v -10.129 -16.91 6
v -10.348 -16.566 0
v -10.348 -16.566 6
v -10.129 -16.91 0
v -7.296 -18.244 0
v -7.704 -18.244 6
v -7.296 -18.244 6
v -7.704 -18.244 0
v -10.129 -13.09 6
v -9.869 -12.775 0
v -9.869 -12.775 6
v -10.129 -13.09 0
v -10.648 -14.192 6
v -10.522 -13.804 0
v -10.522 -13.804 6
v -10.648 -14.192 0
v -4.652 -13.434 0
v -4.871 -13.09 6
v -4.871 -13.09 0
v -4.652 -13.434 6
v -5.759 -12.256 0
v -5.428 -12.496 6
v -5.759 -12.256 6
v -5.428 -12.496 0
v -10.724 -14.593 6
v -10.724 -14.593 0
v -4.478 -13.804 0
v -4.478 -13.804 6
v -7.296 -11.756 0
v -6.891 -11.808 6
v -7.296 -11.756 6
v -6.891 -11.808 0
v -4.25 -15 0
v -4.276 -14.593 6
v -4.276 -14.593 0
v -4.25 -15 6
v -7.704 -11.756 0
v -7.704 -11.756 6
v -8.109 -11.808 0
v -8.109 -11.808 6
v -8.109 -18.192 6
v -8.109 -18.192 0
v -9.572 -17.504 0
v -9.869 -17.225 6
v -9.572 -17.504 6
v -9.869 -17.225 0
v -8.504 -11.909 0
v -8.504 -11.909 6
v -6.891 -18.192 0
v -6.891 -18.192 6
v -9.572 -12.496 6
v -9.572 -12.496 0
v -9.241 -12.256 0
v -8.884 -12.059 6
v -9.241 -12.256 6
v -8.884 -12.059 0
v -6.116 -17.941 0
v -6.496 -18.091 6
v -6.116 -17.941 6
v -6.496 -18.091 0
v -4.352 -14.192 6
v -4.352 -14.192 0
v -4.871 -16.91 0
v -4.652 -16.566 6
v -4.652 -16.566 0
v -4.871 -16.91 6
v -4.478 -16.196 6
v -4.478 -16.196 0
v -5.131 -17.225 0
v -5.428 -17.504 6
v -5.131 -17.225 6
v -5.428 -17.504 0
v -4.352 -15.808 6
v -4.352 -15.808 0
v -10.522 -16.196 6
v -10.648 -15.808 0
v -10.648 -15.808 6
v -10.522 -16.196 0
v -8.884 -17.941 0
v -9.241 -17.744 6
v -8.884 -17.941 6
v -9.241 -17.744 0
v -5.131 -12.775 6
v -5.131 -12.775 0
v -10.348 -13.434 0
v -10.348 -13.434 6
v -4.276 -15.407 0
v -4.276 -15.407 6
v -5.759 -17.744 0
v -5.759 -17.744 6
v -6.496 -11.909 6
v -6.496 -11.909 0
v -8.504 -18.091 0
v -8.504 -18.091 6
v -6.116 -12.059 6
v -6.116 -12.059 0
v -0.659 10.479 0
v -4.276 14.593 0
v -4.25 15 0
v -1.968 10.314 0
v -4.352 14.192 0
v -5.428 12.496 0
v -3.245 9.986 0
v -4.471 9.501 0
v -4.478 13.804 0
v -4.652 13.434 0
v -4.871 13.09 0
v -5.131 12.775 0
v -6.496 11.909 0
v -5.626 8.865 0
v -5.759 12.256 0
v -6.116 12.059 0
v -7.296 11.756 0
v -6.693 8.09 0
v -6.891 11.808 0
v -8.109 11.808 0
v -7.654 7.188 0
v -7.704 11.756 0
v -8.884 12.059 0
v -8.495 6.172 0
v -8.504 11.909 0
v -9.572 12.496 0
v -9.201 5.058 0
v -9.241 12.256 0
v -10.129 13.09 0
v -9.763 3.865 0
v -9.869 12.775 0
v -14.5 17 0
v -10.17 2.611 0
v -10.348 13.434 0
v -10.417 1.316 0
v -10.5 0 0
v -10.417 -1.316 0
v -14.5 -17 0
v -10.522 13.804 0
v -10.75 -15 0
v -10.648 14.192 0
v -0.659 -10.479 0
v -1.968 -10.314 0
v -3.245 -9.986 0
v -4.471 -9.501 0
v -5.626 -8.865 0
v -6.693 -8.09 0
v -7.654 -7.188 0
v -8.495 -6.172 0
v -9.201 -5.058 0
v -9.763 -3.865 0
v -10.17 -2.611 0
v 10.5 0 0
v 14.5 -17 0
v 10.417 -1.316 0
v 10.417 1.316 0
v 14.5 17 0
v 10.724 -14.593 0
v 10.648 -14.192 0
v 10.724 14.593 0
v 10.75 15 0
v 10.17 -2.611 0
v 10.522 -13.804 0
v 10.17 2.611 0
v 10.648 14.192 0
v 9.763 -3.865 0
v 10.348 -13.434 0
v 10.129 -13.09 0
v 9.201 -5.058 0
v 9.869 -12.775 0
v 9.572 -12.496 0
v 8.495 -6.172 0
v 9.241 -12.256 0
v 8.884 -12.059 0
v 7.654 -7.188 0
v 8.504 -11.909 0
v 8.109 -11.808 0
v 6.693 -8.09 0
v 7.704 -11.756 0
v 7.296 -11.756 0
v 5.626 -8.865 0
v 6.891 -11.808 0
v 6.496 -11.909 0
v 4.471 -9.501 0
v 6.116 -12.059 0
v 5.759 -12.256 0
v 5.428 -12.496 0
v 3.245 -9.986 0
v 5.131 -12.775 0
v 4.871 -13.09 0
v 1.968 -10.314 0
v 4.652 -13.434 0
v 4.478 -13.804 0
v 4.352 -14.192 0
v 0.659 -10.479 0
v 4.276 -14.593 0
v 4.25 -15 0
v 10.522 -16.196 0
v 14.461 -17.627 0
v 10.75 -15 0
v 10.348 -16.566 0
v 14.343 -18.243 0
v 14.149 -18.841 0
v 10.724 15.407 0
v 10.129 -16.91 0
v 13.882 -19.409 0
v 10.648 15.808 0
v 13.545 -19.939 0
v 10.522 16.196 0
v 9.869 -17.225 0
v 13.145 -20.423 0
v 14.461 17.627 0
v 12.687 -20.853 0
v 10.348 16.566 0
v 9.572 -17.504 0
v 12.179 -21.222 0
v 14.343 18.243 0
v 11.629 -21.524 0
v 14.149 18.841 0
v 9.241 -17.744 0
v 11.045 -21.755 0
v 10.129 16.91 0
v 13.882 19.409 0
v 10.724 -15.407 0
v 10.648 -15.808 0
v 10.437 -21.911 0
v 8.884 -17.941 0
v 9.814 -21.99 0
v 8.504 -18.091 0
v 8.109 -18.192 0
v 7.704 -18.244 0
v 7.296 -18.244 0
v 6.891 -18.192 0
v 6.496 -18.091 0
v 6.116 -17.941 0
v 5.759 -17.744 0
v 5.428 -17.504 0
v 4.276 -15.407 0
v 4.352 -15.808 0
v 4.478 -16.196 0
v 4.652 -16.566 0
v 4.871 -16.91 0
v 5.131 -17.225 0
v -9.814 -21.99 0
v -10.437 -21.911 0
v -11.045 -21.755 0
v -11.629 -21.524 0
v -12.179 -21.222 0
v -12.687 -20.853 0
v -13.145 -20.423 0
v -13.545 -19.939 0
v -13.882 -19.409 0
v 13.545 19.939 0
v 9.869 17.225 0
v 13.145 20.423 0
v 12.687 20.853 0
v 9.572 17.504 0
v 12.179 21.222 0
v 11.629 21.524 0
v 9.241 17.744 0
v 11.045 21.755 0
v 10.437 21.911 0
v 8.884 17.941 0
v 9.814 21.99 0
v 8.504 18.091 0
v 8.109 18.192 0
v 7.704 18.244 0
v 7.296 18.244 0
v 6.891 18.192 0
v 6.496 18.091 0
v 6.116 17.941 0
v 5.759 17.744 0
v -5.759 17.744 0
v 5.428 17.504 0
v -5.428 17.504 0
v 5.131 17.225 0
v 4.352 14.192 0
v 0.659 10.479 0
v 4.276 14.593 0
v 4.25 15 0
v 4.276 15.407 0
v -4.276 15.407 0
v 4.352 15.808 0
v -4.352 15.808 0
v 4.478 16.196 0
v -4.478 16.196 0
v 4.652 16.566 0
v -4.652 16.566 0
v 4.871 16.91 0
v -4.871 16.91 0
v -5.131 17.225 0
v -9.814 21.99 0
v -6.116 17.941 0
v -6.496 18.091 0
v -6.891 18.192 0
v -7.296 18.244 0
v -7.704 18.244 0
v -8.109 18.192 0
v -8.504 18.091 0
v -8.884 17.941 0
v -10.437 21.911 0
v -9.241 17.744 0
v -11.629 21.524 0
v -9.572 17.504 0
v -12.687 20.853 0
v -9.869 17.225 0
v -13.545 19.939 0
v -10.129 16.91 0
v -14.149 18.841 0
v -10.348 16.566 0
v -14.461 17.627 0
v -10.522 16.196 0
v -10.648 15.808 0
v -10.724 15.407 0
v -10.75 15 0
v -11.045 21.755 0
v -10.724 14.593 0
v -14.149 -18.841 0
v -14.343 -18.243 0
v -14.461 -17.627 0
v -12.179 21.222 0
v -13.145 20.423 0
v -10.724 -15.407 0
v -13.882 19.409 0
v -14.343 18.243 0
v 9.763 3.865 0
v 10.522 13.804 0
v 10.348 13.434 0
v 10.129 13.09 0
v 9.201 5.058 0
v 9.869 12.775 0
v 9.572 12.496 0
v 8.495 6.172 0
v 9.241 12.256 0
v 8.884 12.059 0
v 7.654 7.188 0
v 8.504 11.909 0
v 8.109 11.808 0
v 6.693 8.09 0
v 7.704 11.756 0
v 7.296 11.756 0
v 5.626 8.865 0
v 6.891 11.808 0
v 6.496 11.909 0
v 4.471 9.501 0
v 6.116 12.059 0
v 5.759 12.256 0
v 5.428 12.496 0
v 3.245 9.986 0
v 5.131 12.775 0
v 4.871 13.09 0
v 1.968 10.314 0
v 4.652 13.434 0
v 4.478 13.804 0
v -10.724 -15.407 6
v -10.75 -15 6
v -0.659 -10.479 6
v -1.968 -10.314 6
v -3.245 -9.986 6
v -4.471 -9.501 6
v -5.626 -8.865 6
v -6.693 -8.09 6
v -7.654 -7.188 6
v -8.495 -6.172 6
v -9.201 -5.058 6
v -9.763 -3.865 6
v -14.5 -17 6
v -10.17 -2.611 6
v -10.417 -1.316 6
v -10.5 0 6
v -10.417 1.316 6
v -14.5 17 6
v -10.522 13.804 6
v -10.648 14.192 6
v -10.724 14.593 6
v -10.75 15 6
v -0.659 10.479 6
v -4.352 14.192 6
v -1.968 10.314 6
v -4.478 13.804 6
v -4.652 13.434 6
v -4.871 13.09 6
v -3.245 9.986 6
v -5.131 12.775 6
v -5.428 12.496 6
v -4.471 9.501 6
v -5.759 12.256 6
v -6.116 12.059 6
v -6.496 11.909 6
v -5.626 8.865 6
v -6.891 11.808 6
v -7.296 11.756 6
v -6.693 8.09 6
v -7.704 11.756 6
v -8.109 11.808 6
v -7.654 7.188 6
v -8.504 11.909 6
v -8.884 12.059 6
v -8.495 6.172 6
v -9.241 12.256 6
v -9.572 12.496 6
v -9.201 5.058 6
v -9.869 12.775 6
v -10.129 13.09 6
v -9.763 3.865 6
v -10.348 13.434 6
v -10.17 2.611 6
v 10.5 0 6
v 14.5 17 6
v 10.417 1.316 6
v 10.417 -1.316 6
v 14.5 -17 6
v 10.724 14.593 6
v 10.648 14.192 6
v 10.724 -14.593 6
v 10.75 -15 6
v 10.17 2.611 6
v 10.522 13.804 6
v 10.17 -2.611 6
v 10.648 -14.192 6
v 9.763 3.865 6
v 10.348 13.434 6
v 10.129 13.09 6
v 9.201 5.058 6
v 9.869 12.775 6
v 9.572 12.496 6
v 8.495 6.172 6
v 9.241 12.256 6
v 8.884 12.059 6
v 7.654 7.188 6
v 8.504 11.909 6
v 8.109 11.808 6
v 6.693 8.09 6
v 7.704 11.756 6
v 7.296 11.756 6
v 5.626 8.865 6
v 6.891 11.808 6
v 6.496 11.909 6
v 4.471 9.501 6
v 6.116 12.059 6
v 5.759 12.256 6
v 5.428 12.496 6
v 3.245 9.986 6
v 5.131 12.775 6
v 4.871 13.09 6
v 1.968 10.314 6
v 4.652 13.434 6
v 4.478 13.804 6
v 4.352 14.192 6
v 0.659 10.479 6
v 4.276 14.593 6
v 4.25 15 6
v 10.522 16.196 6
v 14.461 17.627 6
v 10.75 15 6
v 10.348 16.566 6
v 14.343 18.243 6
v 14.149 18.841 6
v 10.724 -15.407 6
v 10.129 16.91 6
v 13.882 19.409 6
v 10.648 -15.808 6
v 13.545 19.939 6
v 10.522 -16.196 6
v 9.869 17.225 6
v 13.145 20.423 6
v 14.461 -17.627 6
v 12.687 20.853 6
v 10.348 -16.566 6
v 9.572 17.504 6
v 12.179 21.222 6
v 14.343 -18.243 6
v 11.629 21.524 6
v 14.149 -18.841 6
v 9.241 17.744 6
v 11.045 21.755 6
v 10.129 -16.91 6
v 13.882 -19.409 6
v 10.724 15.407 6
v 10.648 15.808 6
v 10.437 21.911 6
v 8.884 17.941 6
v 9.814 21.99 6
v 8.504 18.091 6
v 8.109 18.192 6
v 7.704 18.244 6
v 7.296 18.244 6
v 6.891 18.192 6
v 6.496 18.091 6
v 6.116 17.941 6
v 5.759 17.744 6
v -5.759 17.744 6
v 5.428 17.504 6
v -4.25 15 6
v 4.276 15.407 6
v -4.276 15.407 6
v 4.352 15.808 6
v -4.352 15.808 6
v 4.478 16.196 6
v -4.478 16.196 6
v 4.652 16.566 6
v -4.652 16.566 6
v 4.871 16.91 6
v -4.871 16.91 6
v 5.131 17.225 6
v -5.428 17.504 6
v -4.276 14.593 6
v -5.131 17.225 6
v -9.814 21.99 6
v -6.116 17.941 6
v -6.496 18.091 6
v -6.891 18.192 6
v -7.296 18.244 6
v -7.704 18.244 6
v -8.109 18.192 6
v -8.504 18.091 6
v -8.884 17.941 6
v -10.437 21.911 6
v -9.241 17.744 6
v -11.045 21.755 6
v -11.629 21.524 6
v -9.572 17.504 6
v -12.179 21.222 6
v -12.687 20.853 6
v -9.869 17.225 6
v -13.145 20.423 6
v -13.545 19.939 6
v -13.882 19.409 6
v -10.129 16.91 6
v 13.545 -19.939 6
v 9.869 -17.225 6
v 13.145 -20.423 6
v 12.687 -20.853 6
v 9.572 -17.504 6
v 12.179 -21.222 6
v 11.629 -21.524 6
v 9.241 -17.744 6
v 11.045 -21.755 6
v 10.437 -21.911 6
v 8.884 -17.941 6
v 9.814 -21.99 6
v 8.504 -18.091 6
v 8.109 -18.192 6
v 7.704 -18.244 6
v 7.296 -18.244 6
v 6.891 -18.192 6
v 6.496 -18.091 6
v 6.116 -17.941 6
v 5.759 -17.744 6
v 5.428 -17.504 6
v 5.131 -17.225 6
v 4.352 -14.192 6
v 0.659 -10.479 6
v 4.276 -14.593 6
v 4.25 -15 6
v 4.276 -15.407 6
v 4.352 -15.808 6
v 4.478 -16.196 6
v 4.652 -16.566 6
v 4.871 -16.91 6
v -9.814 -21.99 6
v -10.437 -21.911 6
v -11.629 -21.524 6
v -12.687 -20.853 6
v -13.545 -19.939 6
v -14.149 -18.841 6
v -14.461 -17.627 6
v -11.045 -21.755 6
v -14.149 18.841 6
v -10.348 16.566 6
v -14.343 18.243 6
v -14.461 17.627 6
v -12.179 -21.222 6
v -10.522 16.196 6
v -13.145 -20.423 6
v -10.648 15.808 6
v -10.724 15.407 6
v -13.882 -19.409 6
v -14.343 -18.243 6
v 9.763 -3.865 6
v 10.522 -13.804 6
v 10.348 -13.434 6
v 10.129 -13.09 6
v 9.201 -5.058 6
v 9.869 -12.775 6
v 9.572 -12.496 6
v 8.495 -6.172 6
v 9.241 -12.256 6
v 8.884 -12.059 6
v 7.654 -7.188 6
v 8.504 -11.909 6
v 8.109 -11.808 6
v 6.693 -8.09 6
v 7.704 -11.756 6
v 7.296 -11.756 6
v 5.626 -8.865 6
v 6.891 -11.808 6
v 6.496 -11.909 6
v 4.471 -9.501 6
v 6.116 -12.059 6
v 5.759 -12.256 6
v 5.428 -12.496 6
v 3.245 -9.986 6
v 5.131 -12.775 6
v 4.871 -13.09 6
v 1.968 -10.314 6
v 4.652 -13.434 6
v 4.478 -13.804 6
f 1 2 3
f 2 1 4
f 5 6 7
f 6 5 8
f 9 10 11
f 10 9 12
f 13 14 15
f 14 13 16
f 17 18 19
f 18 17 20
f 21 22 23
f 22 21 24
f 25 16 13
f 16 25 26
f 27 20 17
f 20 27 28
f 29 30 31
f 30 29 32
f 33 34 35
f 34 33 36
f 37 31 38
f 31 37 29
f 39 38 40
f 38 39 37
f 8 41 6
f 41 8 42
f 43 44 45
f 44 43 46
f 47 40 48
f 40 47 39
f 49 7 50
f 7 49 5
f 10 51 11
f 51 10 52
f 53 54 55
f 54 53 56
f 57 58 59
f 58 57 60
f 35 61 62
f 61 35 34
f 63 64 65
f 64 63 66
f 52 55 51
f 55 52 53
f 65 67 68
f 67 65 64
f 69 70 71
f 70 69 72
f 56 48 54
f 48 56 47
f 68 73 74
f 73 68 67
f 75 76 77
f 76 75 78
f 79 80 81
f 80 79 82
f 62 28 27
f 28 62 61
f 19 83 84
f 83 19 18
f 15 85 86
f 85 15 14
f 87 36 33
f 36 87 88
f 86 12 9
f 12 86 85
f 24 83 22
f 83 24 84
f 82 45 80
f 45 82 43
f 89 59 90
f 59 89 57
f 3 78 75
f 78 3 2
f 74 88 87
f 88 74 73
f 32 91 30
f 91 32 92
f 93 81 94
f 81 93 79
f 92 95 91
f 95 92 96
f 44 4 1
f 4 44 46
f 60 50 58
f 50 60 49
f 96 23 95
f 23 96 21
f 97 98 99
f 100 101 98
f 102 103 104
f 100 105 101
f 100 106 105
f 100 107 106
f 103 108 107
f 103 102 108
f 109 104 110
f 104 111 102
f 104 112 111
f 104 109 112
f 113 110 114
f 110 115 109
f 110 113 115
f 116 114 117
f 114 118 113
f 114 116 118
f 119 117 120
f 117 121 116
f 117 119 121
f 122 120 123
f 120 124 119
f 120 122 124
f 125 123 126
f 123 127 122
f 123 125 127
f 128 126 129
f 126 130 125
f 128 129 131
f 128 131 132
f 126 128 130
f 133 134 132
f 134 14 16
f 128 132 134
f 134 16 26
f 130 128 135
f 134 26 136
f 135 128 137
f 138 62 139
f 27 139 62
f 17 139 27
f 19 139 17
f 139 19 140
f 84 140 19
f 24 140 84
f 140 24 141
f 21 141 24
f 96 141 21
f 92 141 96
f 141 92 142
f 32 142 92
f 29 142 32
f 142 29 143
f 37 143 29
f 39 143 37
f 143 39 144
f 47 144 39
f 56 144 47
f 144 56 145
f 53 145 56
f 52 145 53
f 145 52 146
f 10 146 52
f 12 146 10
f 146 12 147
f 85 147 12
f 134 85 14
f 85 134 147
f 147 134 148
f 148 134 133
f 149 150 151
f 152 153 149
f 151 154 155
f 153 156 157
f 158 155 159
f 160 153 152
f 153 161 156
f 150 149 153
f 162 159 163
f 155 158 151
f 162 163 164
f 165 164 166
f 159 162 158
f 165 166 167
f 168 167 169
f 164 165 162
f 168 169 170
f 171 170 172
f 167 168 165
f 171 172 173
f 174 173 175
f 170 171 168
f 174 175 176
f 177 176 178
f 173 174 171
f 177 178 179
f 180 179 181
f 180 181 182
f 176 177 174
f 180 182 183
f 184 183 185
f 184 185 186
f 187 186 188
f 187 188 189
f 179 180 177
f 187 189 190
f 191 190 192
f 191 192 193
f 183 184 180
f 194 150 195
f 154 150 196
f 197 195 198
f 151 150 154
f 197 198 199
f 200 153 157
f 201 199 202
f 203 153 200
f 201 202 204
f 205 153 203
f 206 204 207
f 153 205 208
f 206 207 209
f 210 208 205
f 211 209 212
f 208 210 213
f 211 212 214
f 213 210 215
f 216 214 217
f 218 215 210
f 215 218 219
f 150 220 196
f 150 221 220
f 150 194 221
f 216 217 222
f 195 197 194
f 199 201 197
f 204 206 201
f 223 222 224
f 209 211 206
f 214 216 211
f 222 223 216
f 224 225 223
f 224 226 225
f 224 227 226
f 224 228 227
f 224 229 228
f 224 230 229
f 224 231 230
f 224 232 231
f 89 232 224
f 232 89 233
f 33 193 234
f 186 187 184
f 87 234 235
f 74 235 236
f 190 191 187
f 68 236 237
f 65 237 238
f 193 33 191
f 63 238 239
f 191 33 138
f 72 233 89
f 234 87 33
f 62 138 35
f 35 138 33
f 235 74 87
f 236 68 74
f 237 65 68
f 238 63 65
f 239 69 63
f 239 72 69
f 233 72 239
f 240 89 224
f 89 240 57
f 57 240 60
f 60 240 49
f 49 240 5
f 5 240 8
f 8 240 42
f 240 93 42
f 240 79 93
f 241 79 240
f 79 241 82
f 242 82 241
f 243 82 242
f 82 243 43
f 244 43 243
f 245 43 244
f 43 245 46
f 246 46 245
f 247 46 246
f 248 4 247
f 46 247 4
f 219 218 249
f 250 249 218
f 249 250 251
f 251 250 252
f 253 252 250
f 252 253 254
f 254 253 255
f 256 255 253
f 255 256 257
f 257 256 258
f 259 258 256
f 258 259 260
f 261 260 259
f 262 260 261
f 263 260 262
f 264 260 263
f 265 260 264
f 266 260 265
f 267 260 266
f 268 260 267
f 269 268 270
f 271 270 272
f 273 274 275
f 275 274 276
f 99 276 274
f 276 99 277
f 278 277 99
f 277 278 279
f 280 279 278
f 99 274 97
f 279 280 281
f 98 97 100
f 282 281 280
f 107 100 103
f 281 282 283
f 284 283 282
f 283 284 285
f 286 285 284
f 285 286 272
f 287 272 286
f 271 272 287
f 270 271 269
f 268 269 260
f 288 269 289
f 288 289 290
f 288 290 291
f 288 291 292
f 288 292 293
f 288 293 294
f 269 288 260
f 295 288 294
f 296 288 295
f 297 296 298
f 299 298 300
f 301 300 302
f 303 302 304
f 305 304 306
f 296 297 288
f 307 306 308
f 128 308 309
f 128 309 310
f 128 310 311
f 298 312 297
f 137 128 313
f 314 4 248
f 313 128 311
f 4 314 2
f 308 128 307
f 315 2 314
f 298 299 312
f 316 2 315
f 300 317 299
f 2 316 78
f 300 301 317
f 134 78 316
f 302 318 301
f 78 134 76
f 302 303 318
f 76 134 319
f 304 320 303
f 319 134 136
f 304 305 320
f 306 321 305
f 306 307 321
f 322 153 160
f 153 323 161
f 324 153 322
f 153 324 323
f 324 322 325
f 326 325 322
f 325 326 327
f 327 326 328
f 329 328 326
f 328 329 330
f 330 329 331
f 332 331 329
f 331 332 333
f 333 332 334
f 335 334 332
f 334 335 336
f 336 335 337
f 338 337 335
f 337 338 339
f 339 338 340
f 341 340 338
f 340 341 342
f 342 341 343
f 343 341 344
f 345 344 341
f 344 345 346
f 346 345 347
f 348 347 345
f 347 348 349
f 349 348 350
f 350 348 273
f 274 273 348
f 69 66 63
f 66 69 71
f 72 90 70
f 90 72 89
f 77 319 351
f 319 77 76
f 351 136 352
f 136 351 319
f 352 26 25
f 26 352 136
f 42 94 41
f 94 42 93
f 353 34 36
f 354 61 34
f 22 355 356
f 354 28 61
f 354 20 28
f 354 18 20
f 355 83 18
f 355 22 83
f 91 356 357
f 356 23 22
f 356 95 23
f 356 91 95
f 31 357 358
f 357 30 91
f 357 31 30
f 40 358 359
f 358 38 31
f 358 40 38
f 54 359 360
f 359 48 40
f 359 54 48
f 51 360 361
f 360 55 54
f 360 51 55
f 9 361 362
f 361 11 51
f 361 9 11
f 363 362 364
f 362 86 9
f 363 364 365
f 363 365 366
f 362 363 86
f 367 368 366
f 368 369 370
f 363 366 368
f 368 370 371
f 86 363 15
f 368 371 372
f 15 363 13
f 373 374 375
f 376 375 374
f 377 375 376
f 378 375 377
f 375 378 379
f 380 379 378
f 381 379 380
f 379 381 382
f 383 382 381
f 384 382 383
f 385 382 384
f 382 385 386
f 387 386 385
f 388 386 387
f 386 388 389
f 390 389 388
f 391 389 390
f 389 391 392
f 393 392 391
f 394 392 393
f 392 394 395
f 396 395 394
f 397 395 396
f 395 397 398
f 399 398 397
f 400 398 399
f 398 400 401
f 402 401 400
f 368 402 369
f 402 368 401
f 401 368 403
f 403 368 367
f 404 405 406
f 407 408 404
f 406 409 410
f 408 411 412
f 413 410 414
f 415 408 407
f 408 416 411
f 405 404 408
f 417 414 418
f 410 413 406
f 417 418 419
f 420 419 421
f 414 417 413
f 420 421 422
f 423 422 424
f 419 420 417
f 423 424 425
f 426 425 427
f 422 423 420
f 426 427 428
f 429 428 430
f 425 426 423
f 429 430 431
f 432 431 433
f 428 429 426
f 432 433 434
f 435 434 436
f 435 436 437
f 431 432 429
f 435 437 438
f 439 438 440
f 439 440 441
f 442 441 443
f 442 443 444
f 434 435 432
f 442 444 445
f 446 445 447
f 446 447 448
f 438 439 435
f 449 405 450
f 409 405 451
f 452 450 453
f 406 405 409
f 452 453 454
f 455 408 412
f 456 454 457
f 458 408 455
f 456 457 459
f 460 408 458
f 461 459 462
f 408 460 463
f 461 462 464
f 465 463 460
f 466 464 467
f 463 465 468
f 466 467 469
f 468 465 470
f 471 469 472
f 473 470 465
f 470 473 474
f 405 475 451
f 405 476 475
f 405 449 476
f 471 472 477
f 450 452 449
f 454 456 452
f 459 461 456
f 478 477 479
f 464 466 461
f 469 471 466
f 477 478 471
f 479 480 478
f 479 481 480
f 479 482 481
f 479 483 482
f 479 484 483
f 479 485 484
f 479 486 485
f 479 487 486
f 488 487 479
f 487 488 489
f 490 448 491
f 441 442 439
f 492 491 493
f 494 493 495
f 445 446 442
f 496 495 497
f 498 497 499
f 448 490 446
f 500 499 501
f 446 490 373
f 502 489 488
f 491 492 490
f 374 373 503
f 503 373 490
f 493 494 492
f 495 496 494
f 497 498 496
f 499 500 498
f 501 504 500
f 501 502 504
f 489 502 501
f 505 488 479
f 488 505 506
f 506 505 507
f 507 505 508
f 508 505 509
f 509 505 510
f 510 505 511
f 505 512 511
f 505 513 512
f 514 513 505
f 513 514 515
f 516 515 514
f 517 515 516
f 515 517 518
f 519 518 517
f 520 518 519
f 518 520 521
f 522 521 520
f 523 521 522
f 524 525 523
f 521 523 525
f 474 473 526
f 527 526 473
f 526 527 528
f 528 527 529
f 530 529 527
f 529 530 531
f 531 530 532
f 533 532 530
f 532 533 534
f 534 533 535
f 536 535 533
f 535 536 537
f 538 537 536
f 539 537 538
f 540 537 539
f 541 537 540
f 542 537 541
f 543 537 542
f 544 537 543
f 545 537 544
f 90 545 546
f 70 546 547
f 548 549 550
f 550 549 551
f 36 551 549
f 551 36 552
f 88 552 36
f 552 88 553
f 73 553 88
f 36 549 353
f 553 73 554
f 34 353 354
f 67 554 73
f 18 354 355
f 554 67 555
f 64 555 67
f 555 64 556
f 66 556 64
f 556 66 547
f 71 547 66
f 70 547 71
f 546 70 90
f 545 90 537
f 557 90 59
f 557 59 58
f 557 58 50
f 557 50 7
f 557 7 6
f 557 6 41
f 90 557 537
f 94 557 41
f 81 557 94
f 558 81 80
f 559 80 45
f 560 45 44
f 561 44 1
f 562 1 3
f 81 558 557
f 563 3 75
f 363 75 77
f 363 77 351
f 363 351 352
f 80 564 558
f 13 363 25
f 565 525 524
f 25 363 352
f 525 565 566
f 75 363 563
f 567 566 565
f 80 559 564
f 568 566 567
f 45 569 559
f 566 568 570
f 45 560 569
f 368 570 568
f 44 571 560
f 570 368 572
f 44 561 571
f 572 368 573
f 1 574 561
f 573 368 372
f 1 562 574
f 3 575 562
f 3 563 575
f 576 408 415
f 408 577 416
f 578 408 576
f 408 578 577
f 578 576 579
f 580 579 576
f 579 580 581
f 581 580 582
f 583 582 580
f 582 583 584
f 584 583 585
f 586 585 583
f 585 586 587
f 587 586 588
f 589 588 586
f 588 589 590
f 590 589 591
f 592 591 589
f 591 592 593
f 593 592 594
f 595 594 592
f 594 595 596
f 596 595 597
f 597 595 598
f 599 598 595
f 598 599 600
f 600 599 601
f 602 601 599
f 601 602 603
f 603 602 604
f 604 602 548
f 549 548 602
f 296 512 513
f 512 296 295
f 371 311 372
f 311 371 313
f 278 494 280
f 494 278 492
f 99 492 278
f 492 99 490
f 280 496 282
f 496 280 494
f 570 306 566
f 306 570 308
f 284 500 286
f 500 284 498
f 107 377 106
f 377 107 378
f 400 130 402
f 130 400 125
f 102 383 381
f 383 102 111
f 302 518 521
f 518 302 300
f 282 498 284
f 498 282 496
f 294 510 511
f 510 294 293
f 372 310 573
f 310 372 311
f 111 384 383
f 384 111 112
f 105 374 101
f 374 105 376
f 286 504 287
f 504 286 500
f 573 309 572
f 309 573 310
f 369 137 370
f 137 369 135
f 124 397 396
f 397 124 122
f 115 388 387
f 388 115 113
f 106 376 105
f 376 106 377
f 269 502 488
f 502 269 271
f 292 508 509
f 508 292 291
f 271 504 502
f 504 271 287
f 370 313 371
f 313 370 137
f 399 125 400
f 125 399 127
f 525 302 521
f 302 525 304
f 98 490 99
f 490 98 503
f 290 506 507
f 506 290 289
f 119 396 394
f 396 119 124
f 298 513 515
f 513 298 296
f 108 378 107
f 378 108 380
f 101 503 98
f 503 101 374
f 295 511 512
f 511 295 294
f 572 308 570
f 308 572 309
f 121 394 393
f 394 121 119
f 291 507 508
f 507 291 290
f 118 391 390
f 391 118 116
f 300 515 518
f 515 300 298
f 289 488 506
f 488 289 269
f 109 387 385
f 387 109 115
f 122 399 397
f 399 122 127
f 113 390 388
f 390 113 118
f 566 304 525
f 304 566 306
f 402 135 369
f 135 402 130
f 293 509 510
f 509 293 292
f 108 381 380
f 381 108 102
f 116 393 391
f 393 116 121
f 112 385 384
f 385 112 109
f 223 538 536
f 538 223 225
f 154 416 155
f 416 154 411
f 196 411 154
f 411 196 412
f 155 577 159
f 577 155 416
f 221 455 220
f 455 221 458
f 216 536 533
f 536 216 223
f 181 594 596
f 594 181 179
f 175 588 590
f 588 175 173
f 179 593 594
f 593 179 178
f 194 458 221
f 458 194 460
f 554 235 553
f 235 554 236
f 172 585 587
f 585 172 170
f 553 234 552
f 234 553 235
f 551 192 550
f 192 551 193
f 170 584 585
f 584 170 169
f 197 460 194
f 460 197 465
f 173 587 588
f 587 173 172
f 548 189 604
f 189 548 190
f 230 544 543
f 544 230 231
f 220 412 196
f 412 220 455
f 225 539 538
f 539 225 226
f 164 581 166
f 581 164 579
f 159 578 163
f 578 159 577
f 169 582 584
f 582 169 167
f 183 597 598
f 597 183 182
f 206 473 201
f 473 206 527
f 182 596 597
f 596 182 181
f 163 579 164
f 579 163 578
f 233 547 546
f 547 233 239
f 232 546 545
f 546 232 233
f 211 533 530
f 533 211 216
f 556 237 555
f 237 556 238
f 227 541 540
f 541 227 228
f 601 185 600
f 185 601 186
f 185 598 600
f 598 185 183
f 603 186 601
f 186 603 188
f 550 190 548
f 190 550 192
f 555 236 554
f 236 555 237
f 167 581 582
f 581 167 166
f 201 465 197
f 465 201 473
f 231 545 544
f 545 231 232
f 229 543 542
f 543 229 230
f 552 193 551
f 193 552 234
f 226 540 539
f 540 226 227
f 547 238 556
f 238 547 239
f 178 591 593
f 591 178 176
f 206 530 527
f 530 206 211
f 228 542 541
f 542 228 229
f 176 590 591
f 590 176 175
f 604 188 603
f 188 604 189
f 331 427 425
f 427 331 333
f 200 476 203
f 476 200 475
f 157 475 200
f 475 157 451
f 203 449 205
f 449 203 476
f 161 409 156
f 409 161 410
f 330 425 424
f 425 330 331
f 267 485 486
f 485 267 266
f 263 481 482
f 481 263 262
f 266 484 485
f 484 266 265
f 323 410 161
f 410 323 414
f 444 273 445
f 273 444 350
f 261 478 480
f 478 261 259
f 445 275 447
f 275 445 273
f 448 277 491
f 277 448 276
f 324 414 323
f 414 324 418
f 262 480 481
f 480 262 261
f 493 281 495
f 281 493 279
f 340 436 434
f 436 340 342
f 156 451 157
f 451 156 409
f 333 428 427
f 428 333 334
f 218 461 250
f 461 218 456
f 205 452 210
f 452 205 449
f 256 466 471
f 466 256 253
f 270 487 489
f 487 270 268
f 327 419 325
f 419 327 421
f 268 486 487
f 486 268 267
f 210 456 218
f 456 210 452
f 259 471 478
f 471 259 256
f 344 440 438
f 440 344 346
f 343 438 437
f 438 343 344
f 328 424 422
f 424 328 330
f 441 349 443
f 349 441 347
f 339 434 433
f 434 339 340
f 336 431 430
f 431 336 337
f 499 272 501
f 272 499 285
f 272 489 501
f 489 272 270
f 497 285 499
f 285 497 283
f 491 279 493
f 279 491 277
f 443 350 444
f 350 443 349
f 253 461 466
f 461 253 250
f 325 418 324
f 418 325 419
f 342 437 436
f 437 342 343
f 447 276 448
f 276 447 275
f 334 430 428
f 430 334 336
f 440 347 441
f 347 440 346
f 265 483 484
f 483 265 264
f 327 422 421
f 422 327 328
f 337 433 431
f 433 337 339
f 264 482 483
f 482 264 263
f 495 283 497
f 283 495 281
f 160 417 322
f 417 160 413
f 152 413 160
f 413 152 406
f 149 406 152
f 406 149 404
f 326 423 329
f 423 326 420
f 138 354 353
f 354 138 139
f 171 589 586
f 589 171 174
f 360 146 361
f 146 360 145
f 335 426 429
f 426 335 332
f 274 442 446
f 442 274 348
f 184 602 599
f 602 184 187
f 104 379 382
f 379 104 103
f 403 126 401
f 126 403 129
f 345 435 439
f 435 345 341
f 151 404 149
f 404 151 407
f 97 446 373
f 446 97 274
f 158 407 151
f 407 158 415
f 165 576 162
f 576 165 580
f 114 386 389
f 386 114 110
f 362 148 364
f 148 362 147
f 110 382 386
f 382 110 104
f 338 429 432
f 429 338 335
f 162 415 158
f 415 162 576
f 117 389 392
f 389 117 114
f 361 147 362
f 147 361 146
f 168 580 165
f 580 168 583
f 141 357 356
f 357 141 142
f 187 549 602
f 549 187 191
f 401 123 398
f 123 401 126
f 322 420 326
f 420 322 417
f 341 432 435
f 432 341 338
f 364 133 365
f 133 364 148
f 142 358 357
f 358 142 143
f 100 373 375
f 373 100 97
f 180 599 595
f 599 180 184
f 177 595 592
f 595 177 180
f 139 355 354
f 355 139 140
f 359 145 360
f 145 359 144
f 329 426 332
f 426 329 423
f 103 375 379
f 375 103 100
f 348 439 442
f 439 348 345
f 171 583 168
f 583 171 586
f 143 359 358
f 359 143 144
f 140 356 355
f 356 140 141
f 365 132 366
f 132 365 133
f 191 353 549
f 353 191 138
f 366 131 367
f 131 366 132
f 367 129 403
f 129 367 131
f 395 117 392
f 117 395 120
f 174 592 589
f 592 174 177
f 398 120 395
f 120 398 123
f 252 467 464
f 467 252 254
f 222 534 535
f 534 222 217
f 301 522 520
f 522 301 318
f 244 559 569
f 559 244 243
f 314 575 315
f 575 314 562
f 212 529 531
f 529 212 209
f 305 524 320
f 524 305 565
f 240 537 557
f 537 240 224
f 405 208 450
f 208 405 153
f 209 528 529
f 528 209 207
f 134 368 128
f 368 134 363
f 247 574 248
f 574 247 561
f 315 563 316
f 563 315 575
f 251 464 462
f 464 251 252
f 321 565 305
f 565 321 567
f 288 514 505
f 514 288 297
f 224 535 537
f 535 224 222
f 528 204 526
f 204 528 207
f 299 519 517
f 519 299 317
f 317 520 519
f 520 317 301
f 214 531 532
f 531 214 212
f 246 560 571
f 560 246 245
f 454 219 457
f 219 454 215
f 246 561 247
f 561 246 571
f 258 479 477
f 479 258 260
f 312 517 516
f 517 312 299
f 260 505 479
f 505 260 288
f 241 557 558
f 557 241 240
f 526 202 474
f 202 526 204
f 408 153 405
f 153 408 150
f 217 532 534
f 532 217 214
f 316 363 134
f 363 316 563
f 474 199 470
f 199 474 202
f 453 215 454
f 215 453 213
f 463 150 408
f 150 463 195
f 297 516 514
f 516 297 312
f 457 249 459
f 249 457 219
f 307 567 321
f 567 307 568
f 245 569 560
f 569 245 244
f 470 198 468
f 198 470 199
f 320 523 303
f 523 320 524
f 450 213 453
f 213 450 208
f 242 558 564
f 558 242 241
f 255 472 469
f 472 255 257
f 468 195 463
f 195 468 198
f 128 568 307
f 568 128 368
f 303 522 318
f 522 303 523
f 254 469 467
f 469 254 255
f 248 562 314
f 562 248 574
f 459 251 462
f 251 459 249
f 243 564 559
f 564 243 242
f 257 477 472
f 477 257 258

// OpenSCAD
$fn = 50;

difference() {
	union() {
		hull() {
			translate(v = [-9.5, 17.0, 0]) {
				cylinder(h = 6, r = 5);
			}
			translate(v = [9.5, 17.0, 0]) {
				cylinder(h = 6, r = 5);
			}
			translate(v = [-9.5, -17.0, 0]) {
				cylinder(h = 6, r = 5);
			}
			translate(v = [9.5, -17.0, 0]) {
				cylinder(h = 6, r = 5);
			}
		}
	}
	union() {
		translate(v = [-7.5, -15.0, 0]) {
			cylinder(h = 6, r = 3.25);
		}
		translate(v = [-7.5, 15.0, 0]) {
			cylinder(h = 6, r = 3.25);
		}
		translate(v = [7.5, -15.0, 0]) {
			cylinder(h = 6, r = 3.25);
		}
		translate(v = [7.5, 15.0, 0]) {
			cylinder(h = 6, r = 3.25);
		}
		cylinder(h = 6, r = 10.5);
	}
}
